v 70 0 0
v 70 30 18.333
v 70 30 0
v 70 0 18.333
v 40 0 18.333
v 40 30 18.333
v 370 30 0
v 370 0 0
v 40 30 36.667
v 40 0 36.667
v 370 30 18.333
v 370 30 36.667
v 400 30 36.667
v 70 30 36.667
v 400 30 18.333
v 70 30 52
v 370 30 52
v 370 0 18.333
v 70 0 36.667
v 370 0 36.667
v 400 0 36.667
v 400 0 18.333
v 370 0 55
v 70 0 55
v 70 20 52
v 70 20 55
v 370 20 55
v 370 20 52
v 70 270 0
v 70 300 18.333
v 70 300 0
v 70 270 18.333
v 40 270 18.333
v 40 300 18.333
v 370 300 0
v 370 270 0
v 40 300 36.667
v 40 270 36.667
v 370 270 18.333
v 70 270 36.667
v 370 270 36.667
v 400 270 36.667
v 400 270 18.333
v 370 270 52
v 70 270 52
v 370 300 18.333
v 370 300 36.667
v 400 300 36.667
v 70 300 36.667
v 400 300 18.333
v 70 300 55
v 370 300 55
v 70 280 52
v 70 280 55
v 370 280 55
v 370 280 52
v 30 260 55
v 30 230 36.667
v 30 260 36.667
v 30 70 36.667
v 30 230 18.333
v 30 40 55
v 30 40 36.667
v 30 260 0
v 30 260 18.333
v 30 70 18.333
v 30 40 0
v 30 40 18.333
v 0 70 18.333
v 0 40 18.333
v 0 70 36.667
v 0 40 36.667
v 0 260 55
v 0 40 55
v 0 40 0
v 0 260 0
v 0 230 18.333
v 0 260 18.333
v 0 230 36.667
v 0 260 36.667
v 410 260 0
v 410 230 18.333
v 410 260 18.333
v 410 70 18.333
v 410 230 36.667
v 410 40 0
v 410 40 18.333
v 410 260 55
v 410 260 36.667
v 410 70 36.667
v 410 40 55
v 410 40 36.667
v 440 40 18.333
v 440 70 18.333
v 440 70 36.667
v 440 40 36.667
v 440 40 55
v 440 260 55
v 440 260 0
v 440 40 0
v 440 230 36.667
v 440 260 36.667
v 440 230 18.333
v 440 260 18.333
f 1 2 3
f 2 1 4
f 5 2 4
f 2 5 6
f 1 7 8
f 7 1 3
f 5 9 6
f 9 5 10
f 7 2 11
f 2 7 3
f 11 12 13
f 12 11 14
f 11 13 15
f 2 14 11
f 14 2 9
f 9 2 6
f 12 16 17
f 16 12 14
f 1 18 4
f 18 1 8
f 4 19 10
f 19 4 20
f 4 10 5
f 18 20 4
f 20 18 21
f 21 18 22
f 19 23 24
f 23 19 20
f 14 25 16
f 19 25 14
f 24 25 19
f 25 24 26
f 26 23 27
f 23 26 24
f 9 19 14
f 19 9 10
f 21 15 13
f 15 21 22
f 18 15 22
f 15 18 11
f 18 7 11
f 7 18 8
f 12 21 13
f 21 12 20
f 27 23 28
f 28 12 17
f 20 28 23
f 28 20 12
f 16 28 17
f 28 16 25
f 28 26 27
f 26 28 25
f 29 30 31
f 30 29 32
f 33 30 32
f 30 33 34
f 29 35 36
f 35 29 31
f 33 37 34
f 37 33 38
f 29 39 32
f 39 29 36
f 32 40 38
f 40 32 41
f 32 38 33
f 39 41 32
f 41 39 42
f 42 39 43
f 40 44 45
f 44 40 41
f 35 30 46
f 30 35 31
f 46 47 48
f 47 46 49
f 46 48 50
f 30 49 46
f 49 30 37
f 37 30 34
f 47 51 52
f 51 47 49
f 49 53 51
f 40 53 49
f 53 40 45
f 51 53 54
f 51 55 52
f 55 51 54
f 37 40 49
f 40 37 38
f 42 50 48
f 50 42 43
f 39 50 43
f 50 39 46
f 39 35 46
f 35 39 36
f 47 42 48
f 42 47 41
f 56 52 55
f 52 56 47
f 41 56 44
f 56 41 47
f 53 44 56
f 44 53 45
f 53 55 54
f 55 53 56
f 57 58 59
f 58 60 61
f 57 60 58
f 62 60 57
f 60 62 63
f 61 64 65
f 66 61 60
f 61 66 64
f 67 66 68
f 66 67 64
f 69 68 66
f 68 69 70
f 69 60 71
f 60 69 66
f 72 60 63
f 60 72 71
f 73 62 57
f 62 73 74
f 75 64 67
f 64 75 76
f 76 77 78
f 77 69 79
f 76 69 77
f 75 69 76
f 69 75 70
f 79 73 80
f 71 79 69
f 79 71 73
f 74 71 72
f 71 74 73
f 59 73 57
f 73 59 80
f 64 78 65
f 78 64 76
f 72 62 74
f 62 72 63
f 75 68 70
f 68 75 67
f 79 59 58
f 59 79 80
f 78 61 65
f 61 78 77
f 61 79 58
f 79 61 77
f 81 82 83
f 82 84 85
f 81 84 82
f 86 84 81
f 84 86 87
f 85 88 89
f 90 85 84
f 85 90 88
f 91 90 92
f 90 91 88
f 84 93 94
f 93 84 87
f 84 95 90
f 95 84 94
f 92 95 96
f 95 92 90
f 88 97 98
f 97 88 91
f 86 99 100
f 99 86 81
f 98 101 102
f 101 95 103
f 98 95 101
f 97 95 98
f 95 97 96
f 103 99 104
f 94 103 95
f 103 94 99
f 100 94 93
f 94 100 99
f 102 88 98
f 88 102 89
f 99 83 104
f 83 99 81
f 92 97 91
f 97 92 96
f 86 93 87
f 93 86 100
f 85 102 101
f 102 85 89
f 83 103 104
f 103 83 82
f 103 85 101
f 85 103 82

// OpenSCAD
wood = [30,55,1180];
module_height = 180;
overlap = 10;
overlap_depth = 3;
total_modules_width = 300;
explosion = 40;

sides_length = module_height+2*(wood[0]-overlap);
front_length = total_modules_width+2*wood[0];
total_length = 2*(sides_length+front_length);
echo(str("sides: ", sides_length));
echo(str("front: ", front_length));
echo(str("total: ", total_length));

translate([explosion,0,0]) front();
translate([explosion,2*explosion,0]) translate([0,sides_length,0]) mirror([0,1,0]) front();
translate([0,explosion,0]) side();
translate([2*explosion,explosion,0]) translate([front_length, 0,0]) mirror([1,0,0]) side();
 module front(){
     difference(){
        cube([front_length,wood[0],wood[1]]);
        translate([wood[0], wood[0]-overlap, wood[1]-overlap_depth]) 
            cube([total_modules_width, overlap, overlap_depth]);
        front_teeth();
        translate([front_length-wood[0],0,0]) front_teeth();
    }
}
module side(){
    difference(){
        cube([wood[0], sides_length, wood[1]]);
        side_teeth();
        front();
translate([0,sides_length,0]) mirror([0,1,0]) side_teeth();
        }
}
module side_teeth(){
    translate([0,0,wood[1]/3]) cube([wood[0], wood[0], wood[1]/3]);
    }
module front_teeth(){
     cube([wood[0],wood[0], wood[1]/3]);
    translate([0,0,wood[1]/3*2]) cube([wood[0],wood[0], wood[1]/3]);
    }
